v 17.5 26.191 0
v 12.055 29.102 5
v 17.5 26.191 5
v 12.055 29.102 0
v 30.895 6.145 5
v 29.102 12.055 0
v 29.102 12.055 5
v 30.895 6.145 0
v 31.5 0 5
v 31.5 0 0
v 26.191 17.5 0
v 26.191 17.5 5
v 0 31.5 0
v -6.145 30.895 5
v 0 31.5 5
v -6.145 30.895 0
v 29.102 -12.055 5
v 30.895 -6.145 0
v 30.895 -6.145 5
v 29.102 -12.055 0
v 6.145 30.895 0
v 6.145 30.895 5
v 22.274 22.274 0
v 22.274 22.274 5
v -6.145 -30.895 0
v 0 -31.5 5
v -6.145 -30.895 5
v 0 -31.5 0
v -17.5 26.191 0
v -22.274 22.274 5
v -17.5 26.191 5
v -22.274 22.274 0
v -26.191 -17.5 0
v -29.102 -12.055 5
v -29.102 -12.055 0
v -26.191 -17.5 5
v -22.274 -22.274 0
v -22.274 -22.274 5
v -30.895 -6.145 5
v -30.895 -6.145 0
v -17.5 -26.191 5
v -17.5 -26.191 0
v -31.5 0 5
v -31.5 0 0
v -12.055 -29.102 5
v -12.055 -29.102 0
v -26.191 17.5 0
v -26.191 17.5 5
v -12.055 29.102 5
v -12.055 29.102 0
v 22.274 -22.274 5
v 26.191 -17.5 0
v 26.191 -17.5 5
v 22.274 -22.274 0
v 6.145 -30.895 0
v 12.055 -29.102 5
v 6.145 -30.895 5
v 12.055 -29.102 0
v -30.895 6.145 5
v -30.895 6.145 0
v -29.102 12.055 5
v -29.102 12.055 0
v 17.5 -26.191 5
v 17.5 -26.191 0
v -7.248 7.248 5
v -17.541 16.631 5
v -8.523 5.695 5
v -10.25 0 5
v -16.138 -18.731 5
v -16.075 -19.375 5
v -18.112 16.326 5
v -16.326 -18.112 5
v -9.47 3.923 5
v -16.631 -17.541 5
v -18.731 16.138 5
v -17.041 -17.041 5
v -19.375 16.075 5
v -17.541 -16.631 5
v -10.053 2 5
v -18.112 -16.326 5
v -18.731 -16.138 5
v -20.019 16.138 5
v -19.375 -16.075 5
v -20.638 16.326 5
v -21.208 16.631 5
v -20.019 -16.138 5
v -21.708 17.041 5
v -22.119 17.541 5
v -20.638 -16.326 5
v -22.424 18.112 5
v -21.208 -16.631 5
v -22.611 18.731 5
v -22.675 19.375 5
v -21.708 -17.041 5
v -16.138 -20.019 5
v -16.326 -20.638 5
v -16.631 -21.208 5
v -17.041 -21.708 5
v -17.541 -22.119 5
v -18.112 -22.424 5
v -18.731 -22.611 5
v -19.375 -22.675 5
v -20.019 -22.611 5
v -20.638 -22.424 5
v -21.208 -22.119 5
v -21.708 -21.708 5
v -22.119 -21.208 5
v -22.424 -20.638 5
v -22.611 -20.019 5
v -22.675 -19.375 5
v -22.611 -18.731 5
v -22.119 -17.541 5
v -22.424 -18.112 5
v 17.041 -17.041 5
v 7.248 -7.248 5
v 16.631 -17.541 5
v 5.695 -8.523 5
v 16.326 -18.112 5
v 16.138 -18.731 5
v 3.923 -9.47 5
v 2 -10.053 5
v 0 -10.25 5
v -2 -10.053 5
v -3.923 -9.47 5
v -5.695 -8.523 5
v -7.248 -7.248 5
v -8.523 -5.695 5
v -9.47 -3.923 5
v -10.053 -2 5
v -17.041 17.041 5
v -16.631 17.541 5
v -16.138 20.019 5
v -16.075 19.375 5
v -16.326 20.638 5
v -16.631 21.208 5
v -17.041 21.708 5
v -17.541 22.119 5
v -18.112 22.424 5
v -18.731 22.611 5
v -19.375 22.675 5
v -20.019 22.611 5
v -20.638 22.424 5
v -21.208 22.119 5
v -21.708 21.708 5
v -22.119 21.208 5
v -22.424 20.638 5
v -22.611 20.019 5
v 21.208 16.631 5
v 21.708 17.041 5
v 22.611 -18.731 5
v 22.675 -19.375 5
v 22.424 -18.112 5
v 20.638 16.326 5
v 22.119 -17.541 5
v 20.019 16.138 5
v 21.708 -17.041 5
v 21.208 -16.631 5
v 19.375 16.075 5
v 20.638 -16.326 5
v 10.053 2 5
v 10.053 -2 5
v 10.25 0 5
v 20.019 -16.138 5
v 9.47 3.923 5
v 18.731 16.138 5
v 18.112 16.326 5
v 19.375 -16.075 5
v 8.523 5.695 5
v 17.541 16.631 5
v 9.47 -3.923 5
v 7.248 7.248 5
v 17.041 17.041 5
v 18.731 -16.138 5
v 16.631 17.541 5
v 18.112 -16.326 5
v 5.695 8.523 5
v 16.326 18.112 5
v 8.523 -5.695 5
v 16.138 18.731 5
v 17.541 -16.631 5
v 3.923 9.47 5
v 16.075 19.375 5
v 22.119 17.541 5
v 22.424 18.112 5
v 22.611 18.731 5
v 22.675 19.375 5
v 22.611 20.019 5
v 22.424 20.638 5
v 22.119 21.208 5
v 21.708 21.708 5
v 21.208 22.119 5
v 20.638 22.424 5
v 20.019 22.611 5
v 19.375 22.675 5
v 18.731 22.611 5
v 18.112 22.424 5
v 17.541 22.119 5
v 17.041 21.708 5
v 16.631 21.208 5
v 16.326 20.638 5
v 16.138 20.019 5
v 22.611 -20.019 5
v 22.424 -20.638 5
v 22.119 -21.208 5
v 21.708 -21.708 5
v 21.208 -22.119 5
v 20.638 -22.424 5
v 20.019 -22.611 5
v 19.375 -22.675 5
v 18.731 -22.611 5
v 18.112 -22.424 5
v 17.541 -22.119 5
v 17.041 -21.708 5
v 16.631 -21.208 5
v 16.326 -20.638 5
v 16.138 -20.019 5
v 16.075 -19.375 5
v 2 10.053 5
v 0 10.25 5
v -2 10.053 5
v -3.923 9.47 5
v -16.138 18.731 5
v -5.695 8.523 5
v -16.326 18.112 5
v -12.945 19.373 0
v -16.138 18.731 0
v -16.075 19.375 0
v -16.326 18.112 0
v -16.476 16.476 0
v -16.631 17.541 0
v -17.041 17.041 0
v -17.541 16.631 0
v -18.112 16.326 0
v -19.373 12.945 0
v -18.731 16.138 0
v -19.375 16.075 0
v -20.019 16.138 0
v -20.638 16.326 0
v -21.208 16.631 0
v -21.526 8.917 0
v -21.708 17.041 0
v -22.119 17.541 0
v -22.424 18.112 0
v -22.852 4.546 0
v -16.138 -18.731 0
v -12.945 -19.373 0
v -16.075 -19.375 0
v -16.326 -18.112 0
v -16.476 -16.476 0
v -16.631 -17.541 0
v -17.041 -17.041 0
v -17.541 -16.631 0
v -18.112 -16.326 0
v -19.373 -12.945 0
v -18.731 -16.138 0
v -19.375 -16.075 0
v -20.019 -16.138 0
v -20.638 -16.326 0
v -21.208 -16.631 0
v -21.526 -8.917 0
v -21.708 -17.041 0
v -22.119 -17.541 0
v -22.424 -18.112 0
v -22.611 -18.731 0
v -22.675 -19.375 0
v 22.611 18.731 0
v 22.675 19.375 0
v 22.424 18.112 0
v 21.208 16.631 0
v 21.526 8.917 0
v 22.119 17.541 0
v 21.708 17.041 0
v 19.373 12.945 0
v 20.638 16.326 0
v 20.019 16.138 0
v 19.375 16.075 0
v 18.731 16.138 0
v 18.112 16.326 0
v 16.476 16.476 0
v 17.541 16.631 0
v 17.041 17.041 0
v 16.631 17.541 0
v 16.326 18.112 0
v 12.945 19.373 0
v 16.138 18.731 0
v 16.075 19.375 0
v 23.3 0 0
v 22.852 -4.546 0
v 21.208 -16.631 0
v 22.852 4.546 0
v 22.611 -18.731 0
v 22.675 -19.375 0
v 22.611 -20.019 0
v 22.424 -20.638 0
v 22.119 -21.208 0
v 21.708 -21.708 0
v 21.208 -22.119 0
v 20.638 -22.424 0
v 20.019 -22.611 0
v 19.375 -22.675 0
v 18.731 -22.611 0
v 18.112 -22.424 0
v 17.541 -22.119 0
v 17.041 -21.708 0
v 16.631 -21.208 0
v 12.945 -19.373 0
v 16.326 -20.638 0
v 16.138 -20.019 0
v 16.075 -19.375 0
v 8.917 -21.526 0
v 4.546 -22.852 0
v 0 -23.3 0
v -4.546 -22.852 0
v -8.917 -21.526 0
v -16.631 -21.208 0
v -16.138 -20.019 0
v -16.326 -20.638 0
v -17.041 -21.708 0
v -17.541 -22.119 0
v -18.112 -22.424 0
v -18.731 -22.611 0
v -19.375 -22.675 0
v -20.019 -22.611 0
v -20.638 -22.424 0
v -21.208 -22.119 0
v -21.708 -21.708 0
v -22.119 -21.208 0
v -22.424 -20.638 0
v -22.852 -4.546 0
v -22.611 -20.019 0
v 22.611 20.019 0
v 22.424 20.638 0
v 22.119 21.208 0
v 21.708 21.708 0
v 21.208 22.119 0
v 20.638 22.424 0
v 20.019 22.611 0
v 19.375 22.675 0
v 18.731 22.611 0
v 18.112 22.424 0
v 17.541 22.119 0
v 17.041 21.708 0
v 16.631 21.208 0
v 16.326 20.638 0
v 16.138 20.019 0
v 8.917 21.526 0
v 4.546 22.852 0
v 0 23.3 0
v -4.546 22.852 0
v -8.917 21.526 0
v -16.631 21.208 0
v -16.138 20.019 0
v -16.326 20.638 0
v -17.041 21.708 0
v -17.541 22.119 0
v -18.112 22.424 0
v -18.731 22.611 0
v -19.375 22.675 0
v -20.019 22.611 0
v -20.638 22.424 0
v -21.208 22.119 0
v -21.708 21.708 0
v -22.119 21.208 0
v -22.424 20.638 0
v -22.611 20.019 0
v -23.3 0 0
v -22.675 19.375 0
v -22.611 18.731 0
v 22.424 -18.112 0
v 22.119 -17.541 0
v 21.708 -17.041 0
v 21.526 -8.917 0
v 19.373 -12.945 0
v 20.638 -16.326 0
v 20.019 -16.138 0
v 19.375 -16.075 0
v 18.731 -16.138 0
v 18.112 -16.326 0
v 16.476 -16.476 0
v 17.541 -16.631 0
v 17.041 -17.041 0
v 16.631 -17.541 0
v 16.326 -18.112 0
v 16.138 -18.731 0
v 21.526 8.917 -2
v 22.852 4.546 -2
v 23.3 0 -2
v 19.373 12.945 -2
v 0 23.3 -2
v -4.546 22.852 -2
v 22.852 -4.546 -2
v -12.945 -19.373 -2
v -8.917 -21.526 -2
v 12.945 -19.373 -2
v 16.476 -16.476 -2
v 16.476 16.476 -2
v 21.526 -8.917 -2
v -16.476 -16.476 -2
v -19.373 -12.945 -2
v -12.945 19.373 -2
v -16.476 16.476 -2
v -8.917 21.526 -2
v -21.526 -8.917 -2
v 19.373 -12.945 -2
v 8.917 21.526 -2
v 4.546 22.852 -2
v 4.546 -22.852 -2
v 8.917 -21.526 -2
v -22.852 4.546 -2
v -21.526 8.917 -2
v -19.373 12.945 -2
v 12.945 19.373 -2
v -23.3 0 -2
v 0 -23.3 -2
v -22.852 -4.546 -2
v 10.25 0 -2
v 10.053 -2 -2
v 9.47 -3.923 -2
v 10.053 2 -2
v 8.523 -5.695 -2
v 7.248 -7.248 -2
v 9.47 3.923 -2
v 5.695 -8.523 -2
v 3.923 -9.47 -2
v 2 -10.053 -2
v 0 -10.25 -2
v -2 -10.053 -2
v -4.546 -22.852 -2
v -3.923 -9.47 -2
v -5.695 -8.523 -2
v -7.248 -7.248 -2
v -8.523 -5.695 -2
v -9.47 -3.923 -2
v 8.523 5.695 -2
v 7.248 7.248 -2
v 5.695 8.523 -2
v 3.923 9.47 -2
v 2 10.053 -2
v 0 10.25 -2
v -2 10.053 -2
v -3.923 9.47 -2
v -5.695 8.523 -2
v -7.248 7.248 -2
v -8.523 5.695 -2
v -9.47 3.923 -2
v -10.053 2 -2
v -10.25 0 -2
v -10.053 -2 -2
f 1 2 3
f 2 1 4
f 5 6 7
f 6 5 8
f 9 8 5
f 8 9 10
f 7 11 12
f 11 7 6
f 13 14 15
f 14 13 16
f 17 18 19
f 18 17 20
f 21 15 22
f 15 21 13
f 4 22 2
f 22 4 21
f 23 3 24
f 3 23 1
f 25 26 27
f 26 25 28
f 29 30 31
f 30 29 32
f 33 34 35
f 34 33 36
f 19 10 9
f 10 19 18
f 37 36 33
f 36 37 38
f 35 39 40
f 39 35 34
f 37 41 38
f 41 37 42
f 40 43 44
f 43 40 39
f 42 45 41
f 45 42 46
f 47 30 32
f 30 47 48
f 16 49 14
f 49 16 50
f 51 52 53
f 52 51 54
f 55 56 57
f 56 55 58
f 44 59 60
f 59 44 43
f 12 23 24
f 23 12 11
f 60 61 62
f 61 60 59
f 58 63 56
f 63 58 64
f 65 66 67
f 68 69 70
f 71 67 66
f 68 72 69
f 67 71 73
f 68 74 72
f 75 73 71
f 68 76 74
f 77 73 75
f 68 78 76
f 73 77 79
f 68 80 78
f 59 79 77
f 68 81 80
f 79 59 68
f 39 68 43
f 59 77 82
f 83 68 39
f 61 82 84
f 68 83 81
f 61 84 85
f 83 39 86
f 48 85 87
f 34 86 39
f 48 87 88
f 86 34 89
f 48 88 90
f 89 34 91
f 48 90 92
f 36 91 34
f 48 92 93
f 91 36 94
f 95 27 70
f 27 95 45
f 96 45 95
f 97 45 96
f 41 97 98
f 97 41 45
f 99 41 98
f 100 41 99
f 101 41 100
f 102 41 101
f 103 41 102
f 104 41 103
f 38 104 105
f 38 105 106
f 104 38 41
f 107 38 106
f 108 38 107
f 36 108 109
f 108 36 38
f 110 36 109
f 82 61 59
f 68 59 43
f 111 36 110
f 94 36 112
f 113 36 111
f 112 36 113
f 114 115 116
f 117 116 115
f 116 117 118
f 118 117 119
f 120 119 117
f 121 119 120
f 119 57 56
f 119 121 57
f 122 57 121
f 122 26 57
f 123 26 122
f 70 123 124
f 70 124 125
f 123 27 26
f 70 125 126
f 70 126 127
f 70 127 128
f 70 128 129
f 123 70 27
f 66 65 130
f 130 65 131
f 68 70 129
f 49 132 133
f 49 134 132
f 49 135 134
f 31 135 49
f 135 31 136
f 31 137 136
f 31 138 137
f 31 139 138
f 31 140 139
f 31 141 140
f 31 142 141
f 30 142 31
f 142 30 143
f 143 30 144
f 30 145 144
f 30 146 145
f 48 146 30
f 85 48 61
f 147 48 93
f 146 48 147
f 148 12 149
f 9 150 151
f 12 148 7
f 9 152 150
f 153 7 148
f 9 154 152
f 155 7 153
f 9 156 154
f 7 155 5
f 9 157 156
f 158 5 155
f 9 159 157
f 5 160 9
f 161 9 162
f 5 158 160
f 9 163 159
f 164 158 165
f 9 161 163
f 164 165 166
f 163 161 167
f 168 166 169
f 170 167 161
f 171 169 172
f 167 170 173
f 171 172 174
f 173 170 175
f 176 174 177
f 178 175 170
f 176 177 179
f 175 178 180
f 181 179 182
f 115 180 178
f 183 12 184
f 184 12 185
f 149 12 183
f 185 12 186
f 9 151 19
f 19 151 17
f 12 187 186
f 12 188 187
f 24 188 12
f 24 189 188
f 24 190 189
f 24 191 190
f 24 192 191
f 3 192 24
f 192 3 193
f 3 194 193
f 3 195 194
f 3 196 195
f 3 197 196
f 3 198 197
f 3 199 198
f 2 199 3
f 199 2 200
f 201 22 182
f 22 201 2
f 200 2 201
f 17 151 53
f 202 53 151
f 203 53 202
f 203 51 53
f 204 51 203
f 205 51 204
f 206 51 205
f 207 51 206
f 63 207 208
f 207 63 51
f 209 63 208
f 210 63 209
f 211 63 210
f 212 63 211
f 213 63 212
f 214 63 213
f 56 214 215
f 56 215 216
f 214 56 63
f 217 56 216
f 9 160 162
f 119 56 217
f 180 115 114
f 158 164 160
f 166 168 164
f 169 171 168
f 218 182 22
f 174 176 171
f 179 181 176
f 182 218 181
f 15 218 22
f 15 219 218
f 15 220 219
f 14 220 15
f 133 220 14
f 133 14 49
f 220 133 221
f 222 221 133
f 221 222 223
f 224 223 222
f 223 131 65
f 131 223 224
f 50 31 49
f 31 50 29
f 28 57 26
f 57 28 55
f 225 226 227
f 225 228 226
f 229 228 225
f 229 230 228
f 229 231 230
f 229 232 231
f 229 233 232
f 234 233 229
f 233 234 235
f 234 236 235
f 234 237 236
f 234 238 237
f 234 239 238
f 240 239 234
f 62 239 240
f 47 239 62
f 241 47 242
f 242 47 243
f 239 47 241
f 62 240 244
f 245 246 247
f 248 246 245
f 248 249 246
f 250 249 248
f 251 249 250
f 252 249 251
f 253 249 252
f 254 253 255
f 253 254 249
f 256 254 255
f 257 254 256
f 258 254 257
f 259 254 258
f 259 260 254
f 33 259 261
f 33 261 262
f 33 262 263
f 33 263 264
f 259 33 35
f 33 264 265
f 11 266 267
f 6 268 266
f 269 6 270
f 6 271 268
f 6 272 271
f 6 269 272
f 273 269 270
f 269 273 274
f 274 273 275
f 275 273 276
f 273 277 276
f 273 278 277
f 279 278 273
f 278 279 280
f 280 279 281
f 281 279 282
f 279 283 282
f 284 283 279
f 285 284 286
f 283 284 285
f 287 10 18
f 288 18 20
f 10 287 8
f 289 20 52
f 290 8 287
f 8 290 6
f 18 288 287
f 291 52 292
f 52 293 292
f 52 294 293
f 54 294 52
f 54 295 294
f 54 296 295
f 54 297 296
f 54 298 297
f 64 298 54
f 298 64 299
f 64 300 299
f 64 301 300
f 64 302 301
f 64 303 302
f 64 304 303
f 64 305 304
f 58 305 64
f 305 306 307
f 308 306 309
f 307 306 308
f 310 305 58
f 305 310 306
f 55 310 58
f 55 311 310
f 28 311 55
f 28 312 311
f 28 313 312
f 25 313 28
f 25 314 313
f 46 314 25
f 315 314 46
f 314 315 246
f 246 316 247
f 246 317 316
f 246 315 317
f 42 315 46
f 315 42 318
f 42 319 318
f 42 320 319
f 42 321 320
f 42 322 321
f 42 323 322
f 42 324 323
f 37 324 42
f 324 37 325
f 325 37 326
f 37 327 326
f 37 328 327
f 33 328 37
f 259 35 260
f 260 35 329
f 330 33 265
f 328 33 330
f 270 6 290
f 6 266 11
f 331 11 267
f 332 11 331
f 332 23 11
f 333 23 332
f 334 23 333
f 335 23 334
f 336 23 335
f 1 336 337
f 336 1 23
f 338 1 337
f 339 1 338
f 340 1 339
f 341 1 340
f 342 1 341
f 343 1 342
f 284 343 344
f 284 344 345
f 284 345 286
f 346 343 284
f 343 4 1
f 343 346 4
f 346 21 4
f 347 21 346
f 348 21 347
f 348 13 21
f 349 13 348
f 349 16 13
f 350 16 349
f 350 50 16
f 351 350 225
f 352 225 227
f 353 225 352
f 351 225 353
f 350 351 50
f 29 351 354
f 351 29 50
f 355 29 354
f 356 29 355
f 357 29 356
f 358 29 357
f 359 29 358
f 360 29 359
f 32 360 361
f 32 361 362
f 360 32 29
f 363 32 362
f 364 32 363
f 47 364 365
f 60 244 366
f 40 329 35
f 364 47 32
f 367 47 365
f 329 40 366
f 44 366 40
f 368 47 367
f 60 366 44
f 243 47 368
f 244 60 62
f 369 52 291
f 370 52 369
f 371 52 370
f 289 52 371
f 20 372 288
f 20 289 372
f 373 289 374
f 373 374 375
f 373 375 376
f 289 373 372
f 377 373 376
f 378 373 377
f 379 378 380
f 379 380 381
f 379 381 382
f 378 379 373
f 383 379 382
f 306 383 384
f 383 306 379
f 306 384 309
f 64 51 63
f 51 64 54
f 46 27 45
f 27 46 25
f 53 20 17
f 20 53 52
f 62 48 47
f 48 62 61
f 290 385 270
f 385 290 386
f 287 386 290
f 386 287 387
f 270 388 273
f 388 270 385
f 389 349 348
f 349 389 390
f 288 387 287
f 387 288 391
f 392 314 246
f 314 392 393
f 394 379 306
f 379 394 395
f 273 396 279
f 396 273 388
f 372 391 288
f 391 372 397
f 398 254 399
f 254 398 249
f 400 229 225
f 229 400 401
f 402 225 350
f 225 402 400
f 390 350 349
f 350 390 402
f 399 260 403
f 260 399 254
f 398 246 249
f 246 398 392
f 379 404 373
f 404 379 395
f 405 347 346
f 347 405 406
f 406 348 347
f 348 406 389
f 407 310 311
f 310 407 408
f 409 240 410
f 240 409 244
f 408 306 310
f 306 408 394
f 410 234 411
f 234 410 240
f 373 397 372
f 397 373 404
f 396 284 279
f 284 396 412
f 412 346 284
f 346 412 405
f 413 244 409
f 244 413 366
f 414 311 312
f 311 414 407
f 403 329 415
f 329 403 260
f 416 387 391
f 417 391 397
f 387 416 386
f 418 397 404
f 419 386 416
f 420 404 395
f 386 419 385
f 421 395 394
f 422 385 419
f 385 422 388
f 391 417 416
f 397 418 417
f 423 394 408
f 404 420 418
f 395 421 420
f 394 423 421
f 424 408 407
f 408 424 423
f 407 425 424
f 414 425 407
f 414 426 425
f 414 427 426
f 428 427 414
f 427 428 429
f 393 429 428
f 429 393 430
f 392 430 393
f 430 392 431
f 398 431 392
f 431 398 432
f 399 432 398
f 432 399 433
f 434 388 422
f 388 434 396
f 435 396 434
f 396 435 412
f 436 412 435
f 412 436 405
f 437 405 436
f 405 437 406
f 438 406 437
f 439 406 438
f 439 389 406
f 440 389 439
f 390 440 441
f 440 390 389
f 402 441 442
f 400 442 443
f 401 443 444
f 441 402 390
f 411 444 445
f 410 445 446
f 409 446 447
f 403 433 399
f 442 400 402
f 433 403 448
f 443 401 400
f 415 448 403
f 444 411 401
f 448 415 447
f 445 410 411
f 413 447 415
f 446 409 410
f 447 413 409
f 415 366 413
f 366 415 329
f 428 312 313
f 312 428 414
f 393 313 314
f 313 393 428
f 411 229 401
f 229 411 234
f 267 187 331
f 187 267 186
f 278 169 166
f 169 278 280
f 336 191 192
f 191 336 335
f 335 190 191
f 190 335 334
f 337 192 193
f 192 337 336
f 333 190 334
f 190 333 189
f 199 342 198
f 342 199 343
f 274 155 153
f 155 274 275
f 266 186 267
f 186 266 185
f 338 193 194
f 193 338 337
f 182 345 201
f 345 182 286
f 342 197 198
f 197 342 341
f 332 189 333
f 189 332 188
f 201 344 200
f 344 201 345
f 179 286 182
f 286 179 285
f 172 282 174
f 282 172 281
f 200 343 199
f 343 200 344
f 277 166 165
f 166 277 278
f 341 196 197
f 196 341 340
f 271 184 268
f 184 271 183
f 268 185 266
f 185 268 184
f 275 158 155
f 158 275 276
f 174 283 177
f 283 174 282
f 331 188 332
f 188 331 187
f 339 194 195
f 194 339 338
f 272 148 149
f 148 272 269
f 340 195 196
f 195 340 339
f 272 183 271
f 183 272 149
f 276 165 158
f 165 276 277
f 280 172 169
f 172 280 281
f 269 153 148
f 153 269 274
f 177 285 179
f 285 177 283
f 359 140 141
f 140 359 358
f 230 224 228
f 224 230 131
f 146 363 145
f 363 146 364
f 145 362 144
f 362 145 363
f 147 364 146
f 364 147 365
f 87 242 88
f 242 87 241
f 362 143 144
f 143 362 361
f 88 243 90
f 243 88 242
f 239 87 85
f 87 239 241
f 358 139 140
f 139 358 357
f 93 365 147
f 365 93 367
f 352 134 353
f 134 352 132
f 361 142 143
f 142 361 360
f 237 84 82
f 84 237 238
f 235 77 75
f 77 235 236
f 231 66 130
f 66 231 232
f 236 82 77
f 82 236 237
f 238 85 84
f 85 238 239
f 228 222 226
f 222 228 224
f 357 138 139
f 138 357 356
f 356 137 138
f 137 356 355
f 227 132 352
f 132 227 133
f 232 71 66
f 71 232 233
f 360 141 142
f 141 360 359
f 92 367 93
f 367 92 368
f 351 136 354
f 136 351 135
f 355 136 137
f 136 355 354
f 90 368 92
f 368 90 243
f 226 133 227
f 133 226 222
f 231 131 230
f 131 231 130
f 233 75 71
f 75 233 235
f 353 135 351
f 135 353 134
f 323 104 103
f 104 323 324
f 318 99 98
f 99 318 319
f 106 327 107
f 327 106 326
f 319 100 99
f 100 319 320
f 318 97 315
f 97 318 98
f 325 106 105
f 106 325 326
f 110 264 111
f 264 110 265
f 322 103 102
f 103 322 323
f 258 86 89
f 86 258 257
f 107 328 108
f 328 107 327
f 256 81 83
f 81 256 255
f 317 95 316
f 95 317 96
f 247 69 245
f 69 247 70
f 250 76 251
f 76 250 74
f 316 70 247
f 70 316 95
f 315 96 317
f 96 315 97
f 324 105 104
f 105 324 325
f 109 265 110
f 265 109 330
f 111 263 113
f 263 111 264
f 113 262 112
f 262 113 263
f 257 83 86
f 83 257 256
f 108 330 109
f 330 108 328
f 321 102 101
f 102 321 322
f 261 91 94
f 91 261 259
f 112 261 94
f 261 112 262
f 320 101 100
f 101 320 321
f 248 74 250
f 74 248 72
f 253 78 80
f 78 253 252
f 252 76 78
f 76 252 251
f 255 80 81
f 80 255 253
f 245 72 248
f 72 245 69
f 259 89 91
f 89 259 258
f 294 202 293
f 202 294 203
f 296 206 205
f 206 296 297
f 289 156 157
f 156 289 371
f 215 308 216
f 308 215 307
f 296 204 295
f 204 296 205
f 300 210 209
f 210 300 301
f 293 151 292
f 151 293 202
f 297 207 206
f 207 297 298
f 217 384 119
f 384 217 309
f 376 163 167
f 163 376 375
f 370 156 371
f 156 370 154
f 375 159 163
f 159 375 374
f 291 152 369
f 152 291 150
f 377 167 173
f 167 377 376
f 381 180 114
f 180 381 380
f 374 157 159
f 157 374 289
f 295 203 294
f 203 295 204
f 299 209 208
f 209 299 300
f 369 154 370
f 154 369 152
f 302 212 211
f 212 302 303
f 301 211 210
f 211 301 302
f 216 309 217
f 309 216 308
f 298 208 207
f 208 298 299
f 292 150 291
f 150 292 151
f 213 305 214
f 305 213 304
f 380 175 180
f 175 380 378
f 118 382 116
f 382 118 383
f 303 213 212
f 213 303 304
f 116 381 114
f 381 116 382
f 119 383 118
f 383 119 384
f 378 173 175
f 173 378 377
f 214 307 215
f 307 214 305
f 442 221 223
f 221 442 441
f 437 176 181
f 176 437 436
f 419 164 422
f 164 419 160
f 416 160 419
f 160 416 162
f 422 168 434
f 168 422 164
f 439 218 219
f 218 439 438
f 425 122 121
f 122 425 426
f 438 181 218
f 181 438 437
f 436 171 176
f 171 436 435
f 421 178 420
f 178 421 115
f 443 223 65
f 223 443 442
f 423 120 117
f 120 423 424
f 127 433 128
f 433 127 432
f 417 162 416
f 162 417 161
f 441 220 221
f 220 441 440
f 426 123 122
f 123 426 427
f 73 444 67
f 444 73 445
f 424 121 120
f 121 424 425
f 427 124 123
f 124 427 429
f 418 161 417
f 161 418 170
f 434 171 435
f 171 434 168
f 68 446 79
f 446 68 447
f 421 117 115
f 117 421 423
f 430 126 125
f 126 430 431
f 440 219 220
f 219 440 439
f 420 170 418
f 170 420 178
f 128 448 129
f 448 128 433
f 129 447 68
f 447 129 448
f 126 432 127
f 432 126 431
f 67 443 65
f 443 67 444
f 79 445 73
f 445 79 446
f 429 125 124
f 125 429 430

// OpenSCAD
$fn = 32;

// ----------------------------------------------------------------------
// Retaining cap: 6204 cover, 63 mm, spigot 46.6 mm
// ----------------------------------------------------------------------

// --- parameters (mm) ---
cap_d = 63;               // cover diameter
cap_t = 5;                // cover thickness
lip_d = 46.6;             // spigot that enters the housing
lip_h = 2;                // spigot height
shaft_d = 20.5;           // shaft opening
bolt_d = 6.6;             // bolt clearance
bolt_r = 27.4;            // bolt circle radius

module cover() {
  cylinder(h = cap_t, d = cap_d);
}

module spigot() {
  /* sunk 1 mm into the cover; the spigot sets the overall height */
  translate([0, 0, -lip_h]) cylinder(h = lip_h + 1, d = lip_d);
}

difference() {
  union() {
    cover();
    spigot();
  }
  for (i = [0 : 3]) rotate([0, 0, 45 + i * 90]) translate([bolt_r, 0, -lip_h - 1])
    cylinder(h = lip_h + cap_t + 2, d = bolt_d);
  translate([0, 0, -lip_h - 1]) cylinder(h = lip_h + cap_t + 2, d = shaft_d);
}
